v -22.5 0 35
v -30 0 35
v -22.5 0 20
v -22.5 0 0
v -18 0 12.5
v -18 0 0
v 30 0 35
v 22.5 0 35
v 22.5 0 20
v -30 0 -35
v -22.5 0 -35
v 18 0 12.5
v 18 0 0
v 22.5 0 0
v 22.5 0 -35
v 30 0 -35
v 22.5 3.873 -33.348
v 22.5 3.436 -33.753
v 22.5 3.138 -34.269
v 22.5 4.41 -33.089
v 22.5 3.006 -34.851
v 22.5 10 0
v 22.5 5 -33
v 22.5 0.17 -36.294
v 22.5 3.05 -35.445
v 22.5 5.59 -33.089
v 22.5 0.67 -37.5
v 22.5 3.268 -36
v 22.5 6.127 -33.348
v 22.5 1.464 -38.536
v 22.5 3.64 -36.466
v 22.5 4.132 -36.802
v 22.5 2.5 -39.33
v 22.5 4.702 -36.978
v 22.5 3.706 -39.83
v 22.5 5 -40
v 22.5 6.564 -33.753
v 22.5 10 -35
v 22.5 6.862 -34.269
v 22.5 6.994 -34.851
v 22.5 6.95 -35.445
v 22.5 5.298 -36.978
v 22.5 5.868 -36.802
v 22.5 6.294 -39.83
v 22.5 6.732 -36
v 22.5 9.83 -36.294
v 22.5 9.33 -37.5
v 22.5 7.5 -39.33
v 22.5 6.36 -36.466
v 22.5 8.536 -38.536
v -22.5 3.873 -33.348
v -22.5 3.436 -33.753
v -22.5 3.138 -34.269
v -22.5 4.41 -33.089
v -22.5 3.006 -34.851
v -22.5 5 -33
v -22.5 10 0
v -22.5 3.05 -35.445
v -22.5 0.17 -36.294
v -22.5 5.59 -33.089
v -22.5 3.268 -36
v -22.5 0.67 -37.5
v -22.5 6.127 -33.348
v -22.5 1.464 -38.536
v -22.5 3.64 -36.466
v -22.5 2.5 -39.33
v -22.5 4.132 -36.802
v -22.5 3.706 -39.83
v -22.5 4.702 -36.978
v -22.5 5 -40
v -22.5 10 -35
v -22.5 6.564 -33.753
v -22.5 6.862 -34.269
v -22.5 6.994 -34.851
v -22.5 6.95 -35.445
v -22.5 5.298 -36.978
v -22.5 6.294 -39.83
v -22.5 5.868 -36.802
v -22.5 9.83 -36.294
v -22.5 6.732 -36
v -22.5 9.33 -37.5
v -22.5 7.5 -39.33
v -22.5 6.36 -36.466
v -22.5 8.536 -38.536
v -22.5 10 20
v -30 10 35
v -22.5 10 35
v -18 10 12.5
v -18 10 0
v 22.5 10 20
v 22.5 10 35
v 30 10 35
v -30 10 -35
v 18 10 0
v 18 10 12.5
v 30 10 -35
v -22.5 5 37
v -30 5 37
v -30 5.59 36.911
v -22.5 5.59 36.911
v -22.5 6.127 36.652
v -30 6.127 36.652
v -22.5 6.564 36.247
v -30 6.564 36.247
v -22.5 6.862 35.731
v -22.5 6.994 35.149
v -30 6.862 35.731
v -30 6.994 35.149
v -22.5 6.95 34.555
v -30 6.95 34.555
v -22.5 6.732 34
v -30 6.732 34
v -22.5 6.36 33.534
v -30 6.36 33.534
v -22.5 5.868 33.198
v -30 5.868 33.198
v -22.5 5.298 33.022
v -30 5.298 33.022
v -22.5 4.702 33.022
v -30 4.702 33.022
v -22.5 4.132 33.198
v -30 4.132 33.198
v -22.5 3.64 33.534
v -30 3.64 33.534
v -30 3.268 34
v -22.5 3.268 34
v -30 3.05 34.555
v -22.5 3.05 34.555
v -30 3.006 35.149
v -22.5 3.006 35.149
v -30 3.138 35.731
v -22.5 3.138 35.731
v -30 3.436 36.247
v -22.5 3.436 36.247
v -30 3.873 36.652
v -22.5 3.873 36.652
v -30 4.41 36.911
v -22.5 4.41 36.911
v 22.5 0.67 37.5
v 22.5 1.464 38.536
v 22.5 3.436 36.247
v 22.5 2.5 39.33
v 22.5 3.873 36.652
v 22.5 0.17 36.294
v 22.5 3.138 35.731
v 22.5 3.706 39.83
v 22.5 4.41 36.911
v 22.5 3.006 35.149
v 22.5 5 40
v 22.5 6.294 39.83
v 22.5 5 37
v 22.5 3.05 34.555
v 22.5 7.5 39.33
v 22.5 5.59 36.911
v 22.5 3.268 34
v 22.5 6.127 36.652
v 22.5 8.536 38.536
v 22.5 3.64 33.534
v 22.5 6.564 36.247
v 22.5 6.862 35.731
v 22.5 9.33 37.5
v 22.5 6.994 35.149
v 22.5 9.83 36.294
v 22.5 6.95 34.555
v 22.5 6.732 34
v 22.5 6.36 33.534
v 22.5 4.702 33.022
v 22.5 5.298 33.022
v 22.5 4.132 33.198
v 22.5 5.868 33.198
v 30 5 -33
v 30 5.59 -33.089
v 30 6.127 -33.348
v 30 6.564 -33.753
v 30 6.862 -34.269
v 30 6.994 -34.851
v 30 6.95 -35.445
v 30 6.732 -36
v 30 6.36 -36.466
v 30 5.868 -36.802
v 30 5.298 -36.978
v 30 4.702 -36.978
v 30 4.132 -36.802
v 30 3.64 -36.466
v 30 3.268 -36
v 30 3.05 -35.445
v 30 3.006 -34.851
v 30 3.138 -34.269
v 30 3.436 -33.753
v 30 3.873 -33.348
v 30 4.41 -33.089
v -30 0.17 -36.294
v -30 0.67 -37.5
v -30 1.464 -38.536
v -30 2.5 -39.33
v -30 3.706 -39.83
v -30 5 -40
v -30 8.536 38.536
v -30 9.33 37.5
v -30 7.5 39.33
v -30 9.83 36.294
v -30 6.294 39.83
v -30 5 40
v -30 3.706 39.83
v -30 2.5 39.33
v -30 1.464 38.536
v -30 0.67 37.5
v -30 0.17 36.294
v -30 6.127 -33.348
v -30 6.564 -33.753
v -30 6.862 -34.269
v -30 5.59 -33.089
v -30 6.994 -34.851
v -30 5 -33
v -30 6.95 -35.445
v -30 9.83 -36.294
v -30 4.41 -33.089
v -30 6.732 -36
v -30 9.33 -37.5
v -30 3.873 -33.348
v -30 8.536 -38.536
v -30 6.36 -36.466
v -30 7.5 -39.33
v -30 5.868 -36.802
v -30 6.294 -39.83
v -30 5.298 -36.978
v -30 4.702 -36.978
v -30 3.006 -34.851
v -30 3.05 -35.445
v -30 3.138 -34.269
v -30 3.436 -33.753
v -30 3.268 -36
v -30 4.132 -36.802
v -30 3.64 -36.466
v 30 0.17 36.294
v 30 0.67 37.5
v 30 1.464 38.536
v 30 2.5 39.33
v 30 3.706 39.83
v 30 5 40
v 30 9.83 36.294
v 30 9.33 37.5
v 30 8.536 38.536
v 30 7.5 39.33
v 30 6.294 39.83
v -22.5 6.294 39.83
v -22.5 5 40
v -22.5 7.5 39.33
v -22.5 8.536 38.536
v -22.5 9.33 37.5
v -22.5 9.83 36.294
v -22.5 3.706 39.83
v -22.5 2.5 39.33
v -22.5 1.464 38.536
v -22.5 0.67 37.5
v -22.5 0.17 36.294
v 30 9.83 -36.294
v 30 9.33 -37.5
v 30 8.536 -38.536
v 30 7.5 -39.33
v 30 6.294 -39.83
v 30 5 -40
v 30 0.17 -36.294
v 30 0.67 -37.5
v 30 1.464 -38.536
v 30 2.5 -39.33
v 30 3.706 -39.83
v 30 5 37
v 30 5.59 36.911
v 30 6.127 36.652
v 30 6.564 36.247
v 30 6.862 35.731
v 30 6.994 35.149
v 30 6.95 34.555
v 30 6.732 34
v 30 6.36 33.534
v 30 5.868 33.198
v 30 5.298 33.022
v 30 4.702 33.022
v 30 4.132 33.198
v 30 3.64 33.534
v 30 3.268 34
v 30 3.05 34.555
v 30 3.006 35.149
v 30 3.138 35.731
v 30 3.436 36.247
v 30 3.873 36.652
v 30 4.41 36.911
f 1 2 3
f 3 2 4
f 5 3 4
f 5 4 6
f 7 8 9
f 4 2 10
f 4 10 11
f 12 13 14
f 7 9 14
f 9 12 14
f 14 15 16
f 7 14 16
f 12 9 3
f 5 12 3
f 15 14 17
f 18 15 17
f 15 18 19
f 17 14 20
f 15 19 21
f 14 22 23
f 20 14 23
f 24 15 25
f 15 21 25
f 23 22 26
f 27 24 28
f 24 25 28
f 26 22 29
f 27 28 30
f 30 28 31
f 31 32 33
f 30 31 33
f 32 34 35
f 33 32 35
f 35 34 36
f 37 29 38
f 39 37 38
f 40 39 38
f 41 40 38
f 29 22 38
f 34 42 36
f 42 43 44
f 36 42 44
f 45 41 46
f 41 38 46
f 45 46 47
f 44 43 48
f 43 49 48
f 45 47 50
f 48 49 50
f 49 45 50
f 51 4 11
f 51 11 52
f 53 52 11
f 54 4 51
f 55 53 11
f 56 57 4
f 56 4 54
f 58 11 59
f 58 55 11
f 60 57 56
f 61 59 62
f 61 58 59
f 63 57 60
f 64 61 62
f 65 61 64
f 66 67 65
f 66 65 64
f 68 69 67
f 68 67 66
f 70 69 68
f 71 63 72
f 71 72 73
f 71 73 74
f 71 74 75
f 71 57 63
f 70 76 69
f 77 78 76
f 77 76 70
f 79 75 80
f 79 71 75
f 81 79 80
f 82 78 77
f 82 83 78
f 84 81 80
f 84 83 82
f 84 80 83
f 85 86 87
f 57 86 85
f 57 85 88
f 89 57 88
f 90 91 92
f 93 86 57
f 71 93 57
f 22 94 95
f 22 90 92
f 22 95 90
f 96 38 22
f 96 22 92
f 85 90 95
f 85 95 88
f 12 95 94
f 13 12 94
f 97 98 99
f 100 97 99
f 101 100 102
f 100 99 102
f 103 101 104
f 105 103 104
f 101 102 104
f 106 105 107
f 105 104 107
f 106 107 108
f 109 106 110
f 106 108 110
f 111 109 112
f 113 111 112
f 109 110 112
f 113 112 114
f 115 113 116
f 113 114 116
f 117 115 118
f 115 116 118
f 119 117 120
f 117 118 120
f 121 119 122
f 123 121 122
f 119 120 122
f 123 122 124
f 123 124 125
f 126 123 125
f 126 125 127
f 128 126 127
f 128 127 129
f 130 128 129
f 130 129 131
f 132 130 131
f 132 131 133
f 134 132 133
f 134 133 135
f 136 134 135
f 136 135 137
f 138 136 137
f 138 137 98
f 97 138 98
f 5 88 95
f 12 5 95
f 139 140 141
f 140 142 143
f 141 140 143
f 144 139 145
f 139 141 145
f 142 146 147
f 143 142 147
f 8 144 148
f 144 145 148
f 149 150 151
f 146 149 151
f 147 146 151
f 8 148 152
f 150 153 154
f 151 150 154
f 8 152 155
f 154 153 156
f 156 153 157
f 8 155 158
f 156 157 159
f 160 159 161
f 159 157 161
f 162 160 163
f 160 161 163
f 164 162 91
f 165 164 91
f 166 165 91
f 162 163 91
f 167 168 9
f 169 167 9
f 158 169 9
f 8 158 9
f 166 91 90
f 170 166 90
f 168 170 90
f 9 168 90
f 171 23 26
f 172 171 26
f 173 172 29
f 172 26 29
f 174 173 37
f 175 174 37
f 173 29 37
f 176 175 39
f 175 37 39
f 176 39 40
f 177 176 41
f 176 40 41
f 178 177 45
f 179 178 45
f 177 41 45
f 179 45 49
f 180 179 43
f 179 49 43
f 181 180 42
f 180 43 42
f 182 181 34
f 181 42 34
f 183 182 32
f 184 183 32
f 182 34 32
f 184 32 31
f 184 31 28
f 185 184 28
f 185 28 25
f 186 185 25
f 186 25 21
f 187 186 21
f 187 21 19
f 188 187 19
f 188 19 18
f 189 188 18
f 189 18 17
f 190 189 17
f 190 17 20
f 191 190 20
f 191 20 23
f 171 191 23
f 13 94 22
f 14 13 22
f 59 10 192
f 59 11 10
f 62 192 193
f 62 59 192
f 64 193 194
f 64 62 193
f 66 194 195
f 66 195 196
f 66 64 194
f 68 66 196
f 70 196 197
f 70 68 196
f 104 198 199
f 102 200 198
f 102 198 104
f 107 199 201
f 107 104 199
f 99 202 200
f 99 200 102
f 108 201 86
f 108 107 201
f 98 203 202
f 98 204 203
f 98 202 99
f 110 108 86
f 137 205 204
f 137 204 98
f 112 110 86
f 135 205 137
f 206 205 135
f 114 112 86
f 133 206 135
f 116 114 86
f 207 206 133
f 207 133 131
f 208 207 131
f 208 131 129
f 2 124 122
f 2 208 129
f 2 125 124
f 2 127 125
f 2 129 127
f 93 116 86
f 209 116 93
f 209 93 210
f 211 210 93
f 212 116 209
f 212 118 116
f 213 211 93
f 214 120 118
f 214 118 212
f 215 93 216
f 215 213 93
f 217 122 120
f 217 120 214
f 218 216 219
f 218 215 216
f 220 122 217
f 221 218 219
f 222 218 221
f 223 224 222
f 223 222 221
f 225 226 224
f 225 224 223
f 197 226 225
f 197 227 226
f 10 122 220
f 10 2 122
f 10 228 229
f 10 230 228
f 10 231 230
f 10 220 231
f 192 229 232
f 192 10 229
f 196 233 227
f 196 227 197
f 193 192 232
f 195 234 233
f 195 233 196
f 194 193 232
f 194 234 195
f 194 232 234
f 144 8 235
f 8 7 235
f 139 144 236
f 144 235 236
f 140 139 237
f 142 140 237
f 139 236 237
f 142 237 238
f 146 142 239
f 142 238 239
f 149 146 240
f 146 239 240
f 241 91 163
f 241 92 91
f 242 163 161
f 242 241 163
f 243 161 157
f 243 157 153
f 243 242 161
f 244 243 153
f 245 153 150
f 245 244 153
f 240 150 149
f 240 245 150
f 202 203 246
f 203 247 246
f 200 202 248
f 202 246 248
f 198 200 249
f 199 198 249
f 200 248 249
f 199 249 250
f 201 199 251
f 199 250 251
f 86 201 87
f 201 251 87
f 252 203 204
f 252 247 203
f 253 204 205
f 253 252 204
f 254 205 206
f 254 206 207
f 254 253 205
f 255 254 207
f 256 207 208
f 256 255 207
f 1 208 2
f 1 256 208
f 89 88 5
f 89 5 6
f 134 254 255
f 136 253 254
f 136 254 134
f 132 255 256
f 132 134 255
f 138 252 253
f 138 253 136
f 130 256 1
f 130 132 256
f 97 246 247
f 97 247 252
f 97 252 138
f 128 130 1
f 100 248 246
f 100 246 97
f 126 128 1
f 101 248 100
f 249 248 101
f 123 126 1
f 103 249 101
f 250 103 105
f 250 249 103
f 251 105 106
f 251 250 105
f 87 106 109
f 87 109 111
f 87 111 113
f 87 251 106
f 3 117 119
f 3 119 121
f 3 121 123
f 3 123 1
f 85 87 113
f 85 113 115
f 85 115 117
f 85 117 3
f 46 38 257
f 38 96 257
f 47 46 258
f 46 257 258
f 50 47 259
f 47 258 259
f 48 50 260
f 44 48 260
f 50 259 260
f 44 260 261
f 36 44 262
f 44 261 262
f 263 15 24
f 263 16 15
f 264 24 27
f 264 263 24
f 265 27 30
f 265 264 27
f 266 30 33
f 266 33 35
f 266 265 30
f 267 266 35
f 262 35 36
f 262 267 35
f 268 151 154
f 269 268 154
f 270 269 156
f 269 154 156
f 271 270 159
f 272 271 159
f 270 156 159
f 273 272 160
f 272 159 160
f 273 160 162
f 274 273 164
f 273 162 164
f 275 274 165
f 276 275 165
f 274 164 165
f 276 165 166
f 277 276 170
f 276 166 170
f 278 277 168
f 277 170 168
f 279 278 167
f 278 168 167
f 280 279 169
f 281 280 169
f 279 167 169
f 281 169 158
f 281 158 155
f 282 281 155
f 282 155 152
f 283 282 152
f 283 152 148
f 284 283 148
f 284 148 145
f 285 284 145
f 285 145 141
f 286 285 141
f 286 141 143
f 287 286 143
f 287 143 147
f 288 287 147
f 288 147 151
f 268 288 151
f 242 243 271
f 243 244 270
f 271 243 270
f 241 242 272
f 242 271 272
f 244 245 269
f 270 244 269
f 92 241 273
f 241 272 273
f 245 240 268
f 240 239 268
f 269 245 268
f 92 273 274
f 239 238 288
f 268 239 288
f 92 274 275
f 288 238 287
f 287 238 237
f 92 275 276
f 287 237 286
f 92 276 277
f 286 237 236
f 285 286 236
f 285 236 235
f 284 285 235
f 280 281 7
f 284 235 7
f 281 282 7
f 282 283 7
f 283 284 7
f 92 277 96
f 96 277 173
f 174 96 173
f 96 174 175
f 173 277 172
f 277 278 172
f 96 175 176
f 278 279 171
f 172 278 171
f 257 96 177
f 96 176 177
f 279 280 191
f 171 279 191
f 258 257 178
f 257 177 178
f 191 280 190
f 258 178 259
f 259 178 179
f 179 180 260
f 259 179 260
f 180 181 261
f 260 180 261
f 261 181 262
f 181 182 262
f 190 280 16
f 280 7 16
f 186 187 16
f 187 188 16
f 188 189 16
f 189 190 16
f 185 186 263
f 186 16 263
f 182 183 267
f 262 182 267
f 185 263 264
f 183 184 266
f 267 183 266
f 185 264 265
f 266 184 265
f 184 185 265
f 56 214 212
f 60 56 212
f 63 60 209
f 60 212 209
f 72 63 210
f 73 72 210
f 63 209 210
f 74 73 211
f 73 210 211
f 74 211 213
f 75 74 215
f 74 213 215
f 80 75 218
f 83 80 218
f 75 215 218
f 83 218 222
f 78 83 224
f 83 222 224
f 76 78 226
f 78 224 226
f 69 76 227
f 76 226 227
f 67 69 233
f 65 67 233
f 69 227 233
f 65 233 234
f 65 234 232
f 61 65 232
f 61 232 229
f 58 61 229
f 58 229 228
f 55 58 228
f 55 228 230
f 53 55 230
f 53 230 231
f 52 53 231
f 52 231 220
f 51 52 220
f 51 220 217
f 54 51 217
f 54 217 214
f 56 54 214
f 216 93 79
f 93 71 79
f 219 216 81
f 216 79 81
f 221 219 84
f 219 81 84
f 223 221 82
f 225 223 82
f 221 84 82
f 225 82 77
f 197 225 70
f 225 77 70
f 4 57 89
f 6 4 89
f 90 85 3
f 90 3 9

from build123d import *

# Parameters (mm, degrees)
SKETCH1_W           = 60
SKETCH1_H           = 80
BOSS_EXTRUDE1_DEPTH = 10
SKETCH3_W           = 45
SKETCH3_H           = 40
CUT_EXTRUDE1_DEPTH  = 51.990195136
SKETCH4_W           = 45
SKETCH4_H           = 20
CUT_EXTRUDE2_DEPTH  = 51.990195136
SKETCH5_R           = 2
CUT_EXTRUDE3_DEPTH  = 73.801098893
FILLET1_R           = 5
SKETCH6_W           = 36
SKETCH6_H           = 25
CUT_EXTRUDE4_DEPTH  = 51.990195136


with BuildPart() as part:
    # Sketch1 → Boss-Extrude1 (new body)
    with BuildSketch(Plane(origin=(0, 0, 0), x_dir=(1, 0, 0), z_dir=(0, 1, 0))):
        Rectangle(SKETCH1_W, SKETCH1_H)
    extrude(amount=BOSS_EXTRUDE1_DEPTH)

    # Sketch3 → Cut-Extrude1 (cut, through all)
    with BuildSketch(Plane(origin=(0, 10, 0), x_dir=(1, 0, 0), z_dir=(0, 1, 0))):
        with Locations((0, 20)):
            Rectangle(SKETCH3_W, SKETCH3_H)
    extrude(amount=-CUT_EXTRUDE1_DEPTH, mode=Mode.SUBTRACT)

    # Sketch4 → Cut-Extrude2 (cut, through all)
    with BuildSketch(Plane(origin=(0, 10, 0), x_dir=(1, 0, 0), z_dir=(0, 1, 0))):
        with Locations((0, -30)):
            Rectangle(SKETCH4_W, SKETCH4_H)
    extrude(amount=-CUT_EXTRUDE2_DEPTH, mode=Mode.SUBTRACT)

    # Sketch5 → Cut-Extrude3 (cut, through all)
    with BuildSketch(Plane.ZY.offset(30)):
        with Locations((35, 5)):
            Circle(SKETCH5_R)
        with Locations((-35, 5)):
            Circle(SKETCH5_R)
    extrude(amount=-CUT_EXTRUDE3_DEPTH, mode=Mode.SUBTRACT)

    # Fillet1
    fillet1_edges = [part.edges().sort_by_distance(p)[0] for p in [
        (26.25, 0, 40),
        (-26.25, 0, 40),
        (-26.25, 0, -40),
        (26.25, 0, -40),
        (-26.25, 10, -40),
        (-26.25, 10, 40),
        (26.25, 10, 40),
        (26.25, 10, -40),
    ]]
    fillet(fillet1_edges, radius=FILLET1_R - 0.0001)  # a hair under: the kernel refuses the full size

    # Sketch6 → Cut-Extrude4 (cut, through all)
    with BuildSketch(Plane(origin=(0, 10, 0), x_dir=(1, 0, 0), z_dir=(0, 1, 0))):
        Rectangle(SKETCH6_W, SKETCH6_H)
    extrude(amount=-CUT_EXTRUDE4_DEPTH, mode=Mode.SUBTRACT)


solid = part.part
